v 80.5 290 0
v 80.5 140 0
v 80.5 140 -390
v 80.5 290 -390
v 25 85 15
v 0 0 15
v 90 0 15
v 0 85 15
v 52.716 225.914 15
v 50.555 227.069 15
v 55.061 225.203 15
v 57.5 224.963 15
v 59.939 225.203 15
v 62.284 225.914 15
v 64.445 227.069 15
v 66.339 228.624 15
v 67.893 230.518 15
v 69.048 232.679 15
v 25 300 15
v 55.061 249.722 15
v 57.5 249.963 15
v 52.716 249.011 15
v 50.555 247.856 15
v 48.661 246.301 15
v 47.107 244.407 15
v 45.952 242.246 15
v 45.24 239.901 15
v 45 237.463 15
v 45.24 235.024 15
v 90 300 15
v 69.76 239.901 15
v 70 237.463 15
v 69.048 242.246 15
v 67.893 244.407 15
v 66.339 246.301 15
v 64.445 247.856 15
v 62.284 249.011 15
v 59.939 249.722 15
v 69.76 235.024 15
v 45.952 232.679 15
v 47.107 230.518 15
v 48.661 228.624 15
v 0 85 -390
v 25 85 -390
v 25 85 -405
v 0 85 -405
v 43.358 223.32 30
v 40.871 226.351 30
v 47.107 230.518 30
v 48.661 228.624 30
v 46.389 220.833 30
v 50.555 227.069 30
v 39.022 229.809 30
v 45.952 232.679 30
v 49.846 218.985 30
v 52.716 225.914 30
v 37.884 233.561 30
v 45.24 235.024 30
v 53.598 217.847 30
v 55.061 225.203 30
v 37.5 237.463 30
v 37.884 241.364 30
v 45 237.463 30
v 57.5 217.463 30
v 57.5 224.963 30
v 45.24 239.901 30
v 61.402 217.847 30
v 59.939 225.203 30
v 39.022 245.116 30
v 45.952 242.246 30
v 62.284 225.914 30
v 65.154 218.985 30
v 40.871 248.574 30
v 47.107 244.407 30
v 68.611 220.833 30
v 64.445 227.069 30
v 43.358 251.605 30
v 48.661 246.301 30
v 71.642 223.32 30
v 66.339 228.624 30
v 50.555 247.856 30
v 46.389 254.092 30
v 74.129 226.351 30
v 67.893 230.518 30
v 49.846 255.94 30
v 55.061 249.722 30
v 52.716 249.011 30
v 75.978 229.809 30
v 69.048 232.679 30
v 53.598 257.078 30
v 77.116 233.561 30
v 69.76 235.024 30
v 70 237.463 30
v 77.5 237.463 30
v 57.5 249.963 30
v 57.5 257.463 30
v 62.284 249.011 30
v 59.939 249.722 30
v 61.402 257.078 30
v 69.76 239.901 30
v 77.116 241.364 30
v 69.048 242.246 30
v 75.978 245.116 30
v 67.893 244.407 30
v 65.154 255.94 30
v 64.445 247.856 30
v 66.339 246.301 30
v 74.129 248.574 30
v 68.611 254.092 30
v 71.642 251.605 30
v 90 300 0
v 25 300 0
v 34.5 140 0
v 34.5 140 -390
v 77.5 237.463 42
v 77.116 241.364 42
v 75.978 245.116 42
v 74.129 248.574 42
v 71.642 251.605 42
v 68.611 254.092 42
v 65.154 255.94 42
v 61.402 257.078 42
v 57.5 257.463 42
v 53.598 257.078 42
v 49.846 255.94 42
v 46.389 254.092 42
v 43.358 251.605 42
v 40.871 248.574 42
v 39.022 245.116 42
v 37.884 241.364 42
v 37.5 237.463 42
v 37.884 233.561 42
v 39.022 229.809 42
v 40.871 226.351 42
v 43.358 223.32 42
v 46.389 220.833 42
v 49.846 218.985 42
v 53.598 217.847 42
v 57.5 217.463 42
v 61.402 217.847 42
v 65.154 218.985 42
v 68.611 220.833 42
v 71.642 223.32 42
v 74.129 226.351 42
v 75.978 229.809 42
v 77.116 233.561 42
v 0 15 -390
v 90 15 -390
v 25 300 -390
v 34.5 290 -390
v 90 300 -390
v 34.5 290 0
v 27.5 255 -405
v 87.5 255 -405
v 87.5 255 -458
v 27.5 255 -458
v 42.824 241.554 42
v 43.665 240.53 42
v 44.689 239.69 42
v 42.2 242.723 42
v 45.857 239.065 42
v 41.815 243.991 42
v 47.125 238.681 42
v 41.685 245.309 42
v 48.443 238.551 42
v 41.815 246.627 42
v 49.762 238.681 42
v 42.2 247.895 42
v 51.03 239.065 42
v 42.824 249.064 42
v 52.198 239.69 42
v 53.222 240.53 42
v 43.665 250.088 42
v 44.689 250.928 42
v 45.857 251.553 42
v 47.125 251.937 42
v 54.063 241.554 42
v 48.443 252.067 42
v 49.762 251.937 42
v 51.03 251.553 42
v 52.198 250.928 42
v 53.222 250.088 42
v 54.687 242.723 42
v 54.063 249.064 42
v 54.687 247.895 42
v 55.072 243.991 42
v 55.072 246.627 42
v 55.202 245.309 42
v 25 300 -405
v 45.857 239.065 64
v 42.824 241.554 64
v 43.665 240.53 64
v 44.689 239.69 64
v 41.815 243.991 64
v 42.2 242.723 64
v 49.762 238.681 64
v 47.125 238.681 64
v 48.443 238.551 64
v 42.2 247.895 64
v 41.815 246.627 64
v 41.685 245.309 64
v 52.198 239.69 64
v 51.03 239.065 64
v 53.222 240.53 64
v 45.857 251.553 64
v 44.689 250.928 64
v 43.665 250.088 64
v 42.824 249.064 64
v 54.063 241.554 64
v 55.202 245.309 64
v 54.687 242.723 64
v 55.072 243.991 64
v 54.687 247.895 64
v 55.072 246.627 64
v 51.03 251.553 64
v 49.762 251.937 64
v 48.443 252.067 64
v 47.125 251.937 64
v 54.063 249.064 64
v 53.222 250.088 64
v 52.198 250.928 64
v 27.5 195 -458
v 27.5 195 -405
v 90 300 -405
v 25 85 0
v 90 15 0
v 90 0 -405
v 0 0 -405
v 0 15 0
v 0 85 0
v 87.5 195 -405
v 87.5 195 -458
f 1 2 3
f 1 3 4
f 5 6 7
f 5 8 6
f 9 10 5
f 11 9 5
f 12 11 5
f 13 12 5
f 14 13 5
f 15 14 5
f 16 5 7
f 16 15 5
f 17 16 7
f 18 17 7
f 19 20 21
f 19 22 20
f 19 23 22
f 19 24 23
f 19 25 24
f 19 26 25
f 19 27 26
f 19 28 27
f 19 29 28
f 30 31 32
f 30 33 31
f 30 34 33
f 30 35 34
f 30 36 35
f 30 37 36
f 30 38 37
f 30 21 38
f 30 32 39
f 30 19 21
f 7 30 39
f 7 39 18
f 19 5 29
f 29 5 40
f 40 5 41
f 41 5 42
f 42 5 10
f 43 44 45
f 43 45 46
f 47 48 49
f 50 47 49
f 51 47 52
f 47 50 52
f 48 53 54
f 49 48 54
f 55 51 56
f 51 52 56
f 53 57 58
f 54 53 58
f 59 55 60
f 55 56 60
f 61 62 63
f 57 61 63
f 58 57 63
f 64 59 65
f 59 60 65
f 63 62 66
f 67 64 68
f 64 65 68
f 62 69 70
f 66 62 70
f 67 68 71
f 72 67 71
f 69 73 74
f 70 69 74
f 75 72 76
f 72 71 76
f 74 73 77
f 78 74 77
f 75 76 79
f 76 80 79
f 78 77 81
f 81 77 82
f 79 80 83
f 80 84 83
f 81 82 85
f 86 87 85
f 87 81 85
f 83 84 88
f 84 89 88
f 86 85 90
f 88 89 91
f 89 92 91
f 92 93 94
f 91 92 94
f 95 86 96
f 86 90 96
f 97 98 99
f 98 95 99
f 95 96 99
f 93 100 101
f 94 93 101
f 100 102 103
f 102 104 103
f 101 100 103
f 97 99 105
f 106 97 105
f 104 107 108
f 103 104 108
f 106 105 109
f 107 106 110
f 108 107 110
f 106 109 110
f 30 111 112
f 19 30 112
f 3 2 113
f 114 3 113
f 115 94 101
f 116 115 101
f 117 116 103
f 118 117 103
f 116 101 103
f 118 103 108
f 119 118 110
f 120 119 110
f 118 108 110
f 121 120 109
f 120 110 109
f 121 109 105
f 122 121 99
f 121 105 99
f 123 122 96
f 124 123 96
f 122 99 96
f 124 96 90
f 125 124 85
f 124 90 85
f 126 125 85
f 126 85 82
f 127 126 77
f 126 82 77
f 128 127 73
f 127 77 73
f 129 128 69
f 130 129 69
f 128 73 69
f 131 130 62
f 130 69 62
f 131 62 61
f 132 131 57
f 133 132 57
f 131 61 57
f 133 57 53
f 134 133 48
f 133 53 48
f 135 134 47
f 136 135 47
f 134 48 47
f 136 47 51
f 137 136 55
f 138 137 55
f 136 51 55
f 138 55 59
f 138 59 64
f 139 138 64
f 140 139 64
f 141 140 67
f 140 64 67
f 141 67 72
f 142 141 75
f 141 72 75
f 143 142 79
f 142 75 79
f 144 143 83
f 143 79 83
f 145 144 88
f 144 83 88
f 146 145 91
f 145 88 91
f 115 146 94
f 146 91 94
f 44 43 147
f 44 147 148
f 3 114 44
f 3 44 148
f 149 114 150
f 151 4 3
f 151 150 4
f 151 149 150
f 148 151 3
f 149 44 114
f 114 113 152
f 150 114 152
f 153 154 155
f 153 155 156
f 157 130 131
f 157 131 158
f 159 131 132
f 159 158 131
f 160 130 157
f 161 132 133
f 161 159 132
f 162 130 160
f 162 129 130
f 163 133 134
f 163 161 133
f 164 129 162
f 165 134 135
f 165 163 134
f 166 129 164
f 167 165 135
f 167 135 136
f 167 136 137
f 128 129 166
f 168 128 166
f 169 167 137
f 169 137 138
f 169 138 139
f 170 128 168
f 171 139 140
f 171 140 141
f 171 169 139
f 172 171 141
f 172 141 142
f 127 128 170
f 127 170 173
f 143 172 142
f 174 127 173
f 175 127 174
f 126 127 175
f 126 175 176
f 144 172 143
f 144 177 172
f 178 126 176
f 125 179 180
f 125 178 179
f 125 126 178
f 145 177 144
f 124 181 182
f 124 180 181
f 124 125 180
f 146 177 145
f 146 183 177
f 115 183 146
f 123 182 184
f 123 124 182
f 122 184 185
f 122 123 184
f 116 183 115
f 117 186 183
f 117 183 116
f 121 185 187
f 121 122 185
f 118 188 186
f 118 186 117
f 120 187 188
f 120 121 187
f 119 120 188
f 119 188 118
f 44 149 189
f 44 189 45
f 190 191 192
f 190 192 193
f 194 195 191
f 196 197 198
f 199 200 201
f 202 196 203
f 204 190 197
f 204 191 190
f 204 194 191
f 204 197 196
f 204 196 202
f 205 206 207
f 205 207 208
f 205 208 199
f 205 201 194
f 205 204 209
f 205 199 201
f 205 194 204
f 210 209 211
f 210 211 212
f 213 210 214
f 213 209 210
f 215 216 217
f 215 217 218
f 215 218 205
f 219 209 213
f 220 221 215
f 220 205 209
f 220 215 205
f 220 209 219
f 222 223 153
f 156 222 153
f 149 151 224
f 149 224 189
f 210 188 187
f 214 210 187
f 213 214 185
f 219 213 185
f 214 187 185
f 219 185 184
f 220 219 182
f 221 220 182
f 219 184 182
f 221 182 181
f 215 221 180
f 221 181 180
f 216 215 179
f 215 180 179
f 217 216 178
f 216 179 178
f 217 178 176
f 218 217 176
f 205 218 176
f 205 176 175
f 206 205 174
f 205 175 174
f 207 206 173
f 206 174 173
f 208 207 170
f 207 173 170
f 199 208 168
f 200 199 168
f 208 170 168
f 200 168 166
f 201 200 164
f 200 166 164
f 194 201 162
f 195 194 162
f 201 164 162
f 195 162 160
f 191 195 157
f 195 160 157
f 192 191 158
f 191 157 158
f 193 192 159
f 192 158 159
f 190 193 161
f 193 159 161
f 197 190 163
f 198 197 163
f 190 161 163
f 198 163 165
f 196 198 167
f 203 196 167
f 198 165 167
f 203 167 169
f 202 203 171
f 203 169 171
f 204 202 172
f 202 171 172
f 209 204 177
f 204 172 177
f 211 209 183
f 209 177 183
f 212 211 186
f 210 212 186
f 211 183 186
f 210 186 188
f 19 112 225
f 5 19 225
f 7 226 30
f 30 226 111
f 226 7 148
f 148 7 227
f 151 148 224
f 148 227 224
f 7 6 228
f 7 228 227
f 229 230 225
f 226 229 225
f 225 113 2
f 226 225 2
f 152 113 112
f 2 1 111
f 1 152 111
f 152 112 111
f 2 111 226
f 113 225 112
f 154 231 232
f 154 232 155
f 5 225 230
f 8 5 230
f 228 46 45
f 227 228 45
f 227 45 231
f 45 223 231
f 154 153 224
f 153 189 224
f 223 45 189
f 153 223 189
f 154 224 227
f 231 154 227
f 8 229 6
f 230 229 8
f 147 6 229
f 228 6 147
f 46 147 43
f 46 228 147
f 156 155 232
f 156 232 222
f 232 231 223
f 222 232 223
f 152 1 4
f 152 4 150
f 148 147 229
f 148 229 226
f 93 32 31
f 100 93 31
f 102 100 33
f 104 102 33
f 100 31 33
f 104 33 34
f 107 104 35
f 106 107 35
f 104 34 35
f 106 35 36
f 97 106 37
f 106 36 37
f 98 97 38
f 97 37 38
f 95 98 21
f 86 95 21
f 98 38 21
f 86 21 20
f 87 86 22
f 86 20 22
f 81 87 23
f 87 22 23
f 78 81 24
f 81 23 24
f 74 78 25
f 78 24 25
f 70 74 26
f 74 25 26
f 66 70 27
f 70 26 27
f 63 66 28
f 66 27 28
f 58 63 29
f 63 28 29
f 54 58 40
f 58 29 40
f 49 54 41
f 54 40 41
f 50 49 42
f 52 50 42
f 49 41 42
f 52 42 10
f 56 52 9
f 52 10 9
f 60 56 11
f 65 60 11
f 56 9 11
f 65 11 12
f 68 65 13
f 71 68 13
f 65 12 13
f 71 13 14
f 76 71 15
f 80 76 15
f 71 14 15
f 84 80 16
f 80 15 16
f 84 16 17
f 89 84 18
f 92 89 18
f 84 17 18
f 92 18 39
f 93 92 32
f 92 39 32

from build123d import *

# Parameters (mm, degrees)
EXTRUDE_1_DEPTH = 15
SKETCH_2_R      = 12.5
EXTRUDE_2_DEPTH = 15
SKETCH_3_R      = 20
EXTRUDE_3_DEPTH = 12
SKETCH_4_W      = 46
SKETCH_4_H      = 150
EXTRUDE_4_DEPTH = 390
EXTRUDE_5_DEPTH = 15
SKETCH_7_W      = 60
SKETCH_7_H      = 60
EXTRUDE_6_DEPTH = 53
EXTRUDE_7_REACH = 434
SKETCH_8_W      = 90
SKETCH_8_H      = 15
SKETCH_9_R      = 6.75806605
EXTRUDE_8_DEPTH = 22


with BuildPart() as part:
    # ｽｹｯﾁ1 → ﾎﾞｽ - 押し出し1 (new body)
    with BuildSketch(Plane.XY):
        Polygon((0, 0), (90, 0), (90, 300), (25, 300), (25, 85), (0, 85), align=None)
    extrude(amount=EXTRUDE_1_DEPTH)

    # ｽｹｯﾁ2 → ﾎﾞｽ - 押し出し2 (add)
    with BuildSketch(Plane.XY.offset(15)):
        with Locations((57.5, 237.462606559)):
            Circle(SKETCH_2_R)
    extrude(amount=EXTRUDE_2_DEPTH)

    # ｽｹｯﾁ3 → ﾎﾞｽ - 押し出し3 (add)
    with BuildSketch(Plane.XY.offset(30)):
        with Locations((57.5, 237.462606559)):
            Circle(SKETCH_3_R)
    extrude(amount=EXTRUDE_3_DEPTH)

    # ｽｹｯﾁ4 → ﾎﾞｽ - 押し出し4 (add)
    with BuildSketch(Plane(origin=(0, 0, 0), x_dir=(-1, 0, 0), z_dir=(0, 0, -1))):
        with Locations((-57.5, 215)):
            Rectangle(SKETCH_4_W, SKETCH_4_H)
    extrude(amount=EXTRUDE_4_DEPTH)

    # ｽｹｯﾁ6 → ﾎﾞｽ - 押し出し5 (add)
    with BuildSketch(Plane(origin=(0, 0, -390), x_dir=(-1, 0, 0), z_dir=(0, 0, -1))):
        Polygon((-90, 300), (-25, 300), (-25, 85), (0, 85), (0, 0), (-90, 0), align=None)
    extrude(amount=EXTRUDE_5_DEPTH)

    # ｽｹｯﾁ7 → ﾎﾞｽ - 押し出し6 (add)
    with BuildSketch(Plane(origin=(0, 0, -405), x_dir=(-1, 0, 0), z_dir=(0, 0, -1))):
        with Locations((-57.5, 225)):
            Rectangle(SKETCH_7_W, SKETCH_7_H)
    extrude(amount=EXTRUDE_6_DEPTH)

    # ｽｹｯﾁ8 → ﾎﾞｽ - 押し出し7 (add, up to next)
    with BuildSketch(Plane.XY.offset(-390), mode=Mode.PRIVATE) as extrude_7_sk1:
        with Locations((45, 7.5)):
            Rectangle(SKETCH_8_W, SKETCH_8_H)
    extrude_7_tool1 = extrude(extrude_7_sk1.sketch, amount=EXTRUDE_7_REACH, mode=Mode.PRIVATE) - part.part
    add(extrude_7_tool1.solids().sort_by_distance((45, 7.5, -390))[0])

    # ｽｹｯﾁ9 → ﾎﾞｽ - 押し出し8 (add)
    with BuildSketch(Plane.XY.offset(42)):
        with Locations((48.443492705, 245.308936779)):
            Circle(SKETCH_9_R)
    extrude(amount=EXTRUDE_8_DEPTH)


solid = part.part
